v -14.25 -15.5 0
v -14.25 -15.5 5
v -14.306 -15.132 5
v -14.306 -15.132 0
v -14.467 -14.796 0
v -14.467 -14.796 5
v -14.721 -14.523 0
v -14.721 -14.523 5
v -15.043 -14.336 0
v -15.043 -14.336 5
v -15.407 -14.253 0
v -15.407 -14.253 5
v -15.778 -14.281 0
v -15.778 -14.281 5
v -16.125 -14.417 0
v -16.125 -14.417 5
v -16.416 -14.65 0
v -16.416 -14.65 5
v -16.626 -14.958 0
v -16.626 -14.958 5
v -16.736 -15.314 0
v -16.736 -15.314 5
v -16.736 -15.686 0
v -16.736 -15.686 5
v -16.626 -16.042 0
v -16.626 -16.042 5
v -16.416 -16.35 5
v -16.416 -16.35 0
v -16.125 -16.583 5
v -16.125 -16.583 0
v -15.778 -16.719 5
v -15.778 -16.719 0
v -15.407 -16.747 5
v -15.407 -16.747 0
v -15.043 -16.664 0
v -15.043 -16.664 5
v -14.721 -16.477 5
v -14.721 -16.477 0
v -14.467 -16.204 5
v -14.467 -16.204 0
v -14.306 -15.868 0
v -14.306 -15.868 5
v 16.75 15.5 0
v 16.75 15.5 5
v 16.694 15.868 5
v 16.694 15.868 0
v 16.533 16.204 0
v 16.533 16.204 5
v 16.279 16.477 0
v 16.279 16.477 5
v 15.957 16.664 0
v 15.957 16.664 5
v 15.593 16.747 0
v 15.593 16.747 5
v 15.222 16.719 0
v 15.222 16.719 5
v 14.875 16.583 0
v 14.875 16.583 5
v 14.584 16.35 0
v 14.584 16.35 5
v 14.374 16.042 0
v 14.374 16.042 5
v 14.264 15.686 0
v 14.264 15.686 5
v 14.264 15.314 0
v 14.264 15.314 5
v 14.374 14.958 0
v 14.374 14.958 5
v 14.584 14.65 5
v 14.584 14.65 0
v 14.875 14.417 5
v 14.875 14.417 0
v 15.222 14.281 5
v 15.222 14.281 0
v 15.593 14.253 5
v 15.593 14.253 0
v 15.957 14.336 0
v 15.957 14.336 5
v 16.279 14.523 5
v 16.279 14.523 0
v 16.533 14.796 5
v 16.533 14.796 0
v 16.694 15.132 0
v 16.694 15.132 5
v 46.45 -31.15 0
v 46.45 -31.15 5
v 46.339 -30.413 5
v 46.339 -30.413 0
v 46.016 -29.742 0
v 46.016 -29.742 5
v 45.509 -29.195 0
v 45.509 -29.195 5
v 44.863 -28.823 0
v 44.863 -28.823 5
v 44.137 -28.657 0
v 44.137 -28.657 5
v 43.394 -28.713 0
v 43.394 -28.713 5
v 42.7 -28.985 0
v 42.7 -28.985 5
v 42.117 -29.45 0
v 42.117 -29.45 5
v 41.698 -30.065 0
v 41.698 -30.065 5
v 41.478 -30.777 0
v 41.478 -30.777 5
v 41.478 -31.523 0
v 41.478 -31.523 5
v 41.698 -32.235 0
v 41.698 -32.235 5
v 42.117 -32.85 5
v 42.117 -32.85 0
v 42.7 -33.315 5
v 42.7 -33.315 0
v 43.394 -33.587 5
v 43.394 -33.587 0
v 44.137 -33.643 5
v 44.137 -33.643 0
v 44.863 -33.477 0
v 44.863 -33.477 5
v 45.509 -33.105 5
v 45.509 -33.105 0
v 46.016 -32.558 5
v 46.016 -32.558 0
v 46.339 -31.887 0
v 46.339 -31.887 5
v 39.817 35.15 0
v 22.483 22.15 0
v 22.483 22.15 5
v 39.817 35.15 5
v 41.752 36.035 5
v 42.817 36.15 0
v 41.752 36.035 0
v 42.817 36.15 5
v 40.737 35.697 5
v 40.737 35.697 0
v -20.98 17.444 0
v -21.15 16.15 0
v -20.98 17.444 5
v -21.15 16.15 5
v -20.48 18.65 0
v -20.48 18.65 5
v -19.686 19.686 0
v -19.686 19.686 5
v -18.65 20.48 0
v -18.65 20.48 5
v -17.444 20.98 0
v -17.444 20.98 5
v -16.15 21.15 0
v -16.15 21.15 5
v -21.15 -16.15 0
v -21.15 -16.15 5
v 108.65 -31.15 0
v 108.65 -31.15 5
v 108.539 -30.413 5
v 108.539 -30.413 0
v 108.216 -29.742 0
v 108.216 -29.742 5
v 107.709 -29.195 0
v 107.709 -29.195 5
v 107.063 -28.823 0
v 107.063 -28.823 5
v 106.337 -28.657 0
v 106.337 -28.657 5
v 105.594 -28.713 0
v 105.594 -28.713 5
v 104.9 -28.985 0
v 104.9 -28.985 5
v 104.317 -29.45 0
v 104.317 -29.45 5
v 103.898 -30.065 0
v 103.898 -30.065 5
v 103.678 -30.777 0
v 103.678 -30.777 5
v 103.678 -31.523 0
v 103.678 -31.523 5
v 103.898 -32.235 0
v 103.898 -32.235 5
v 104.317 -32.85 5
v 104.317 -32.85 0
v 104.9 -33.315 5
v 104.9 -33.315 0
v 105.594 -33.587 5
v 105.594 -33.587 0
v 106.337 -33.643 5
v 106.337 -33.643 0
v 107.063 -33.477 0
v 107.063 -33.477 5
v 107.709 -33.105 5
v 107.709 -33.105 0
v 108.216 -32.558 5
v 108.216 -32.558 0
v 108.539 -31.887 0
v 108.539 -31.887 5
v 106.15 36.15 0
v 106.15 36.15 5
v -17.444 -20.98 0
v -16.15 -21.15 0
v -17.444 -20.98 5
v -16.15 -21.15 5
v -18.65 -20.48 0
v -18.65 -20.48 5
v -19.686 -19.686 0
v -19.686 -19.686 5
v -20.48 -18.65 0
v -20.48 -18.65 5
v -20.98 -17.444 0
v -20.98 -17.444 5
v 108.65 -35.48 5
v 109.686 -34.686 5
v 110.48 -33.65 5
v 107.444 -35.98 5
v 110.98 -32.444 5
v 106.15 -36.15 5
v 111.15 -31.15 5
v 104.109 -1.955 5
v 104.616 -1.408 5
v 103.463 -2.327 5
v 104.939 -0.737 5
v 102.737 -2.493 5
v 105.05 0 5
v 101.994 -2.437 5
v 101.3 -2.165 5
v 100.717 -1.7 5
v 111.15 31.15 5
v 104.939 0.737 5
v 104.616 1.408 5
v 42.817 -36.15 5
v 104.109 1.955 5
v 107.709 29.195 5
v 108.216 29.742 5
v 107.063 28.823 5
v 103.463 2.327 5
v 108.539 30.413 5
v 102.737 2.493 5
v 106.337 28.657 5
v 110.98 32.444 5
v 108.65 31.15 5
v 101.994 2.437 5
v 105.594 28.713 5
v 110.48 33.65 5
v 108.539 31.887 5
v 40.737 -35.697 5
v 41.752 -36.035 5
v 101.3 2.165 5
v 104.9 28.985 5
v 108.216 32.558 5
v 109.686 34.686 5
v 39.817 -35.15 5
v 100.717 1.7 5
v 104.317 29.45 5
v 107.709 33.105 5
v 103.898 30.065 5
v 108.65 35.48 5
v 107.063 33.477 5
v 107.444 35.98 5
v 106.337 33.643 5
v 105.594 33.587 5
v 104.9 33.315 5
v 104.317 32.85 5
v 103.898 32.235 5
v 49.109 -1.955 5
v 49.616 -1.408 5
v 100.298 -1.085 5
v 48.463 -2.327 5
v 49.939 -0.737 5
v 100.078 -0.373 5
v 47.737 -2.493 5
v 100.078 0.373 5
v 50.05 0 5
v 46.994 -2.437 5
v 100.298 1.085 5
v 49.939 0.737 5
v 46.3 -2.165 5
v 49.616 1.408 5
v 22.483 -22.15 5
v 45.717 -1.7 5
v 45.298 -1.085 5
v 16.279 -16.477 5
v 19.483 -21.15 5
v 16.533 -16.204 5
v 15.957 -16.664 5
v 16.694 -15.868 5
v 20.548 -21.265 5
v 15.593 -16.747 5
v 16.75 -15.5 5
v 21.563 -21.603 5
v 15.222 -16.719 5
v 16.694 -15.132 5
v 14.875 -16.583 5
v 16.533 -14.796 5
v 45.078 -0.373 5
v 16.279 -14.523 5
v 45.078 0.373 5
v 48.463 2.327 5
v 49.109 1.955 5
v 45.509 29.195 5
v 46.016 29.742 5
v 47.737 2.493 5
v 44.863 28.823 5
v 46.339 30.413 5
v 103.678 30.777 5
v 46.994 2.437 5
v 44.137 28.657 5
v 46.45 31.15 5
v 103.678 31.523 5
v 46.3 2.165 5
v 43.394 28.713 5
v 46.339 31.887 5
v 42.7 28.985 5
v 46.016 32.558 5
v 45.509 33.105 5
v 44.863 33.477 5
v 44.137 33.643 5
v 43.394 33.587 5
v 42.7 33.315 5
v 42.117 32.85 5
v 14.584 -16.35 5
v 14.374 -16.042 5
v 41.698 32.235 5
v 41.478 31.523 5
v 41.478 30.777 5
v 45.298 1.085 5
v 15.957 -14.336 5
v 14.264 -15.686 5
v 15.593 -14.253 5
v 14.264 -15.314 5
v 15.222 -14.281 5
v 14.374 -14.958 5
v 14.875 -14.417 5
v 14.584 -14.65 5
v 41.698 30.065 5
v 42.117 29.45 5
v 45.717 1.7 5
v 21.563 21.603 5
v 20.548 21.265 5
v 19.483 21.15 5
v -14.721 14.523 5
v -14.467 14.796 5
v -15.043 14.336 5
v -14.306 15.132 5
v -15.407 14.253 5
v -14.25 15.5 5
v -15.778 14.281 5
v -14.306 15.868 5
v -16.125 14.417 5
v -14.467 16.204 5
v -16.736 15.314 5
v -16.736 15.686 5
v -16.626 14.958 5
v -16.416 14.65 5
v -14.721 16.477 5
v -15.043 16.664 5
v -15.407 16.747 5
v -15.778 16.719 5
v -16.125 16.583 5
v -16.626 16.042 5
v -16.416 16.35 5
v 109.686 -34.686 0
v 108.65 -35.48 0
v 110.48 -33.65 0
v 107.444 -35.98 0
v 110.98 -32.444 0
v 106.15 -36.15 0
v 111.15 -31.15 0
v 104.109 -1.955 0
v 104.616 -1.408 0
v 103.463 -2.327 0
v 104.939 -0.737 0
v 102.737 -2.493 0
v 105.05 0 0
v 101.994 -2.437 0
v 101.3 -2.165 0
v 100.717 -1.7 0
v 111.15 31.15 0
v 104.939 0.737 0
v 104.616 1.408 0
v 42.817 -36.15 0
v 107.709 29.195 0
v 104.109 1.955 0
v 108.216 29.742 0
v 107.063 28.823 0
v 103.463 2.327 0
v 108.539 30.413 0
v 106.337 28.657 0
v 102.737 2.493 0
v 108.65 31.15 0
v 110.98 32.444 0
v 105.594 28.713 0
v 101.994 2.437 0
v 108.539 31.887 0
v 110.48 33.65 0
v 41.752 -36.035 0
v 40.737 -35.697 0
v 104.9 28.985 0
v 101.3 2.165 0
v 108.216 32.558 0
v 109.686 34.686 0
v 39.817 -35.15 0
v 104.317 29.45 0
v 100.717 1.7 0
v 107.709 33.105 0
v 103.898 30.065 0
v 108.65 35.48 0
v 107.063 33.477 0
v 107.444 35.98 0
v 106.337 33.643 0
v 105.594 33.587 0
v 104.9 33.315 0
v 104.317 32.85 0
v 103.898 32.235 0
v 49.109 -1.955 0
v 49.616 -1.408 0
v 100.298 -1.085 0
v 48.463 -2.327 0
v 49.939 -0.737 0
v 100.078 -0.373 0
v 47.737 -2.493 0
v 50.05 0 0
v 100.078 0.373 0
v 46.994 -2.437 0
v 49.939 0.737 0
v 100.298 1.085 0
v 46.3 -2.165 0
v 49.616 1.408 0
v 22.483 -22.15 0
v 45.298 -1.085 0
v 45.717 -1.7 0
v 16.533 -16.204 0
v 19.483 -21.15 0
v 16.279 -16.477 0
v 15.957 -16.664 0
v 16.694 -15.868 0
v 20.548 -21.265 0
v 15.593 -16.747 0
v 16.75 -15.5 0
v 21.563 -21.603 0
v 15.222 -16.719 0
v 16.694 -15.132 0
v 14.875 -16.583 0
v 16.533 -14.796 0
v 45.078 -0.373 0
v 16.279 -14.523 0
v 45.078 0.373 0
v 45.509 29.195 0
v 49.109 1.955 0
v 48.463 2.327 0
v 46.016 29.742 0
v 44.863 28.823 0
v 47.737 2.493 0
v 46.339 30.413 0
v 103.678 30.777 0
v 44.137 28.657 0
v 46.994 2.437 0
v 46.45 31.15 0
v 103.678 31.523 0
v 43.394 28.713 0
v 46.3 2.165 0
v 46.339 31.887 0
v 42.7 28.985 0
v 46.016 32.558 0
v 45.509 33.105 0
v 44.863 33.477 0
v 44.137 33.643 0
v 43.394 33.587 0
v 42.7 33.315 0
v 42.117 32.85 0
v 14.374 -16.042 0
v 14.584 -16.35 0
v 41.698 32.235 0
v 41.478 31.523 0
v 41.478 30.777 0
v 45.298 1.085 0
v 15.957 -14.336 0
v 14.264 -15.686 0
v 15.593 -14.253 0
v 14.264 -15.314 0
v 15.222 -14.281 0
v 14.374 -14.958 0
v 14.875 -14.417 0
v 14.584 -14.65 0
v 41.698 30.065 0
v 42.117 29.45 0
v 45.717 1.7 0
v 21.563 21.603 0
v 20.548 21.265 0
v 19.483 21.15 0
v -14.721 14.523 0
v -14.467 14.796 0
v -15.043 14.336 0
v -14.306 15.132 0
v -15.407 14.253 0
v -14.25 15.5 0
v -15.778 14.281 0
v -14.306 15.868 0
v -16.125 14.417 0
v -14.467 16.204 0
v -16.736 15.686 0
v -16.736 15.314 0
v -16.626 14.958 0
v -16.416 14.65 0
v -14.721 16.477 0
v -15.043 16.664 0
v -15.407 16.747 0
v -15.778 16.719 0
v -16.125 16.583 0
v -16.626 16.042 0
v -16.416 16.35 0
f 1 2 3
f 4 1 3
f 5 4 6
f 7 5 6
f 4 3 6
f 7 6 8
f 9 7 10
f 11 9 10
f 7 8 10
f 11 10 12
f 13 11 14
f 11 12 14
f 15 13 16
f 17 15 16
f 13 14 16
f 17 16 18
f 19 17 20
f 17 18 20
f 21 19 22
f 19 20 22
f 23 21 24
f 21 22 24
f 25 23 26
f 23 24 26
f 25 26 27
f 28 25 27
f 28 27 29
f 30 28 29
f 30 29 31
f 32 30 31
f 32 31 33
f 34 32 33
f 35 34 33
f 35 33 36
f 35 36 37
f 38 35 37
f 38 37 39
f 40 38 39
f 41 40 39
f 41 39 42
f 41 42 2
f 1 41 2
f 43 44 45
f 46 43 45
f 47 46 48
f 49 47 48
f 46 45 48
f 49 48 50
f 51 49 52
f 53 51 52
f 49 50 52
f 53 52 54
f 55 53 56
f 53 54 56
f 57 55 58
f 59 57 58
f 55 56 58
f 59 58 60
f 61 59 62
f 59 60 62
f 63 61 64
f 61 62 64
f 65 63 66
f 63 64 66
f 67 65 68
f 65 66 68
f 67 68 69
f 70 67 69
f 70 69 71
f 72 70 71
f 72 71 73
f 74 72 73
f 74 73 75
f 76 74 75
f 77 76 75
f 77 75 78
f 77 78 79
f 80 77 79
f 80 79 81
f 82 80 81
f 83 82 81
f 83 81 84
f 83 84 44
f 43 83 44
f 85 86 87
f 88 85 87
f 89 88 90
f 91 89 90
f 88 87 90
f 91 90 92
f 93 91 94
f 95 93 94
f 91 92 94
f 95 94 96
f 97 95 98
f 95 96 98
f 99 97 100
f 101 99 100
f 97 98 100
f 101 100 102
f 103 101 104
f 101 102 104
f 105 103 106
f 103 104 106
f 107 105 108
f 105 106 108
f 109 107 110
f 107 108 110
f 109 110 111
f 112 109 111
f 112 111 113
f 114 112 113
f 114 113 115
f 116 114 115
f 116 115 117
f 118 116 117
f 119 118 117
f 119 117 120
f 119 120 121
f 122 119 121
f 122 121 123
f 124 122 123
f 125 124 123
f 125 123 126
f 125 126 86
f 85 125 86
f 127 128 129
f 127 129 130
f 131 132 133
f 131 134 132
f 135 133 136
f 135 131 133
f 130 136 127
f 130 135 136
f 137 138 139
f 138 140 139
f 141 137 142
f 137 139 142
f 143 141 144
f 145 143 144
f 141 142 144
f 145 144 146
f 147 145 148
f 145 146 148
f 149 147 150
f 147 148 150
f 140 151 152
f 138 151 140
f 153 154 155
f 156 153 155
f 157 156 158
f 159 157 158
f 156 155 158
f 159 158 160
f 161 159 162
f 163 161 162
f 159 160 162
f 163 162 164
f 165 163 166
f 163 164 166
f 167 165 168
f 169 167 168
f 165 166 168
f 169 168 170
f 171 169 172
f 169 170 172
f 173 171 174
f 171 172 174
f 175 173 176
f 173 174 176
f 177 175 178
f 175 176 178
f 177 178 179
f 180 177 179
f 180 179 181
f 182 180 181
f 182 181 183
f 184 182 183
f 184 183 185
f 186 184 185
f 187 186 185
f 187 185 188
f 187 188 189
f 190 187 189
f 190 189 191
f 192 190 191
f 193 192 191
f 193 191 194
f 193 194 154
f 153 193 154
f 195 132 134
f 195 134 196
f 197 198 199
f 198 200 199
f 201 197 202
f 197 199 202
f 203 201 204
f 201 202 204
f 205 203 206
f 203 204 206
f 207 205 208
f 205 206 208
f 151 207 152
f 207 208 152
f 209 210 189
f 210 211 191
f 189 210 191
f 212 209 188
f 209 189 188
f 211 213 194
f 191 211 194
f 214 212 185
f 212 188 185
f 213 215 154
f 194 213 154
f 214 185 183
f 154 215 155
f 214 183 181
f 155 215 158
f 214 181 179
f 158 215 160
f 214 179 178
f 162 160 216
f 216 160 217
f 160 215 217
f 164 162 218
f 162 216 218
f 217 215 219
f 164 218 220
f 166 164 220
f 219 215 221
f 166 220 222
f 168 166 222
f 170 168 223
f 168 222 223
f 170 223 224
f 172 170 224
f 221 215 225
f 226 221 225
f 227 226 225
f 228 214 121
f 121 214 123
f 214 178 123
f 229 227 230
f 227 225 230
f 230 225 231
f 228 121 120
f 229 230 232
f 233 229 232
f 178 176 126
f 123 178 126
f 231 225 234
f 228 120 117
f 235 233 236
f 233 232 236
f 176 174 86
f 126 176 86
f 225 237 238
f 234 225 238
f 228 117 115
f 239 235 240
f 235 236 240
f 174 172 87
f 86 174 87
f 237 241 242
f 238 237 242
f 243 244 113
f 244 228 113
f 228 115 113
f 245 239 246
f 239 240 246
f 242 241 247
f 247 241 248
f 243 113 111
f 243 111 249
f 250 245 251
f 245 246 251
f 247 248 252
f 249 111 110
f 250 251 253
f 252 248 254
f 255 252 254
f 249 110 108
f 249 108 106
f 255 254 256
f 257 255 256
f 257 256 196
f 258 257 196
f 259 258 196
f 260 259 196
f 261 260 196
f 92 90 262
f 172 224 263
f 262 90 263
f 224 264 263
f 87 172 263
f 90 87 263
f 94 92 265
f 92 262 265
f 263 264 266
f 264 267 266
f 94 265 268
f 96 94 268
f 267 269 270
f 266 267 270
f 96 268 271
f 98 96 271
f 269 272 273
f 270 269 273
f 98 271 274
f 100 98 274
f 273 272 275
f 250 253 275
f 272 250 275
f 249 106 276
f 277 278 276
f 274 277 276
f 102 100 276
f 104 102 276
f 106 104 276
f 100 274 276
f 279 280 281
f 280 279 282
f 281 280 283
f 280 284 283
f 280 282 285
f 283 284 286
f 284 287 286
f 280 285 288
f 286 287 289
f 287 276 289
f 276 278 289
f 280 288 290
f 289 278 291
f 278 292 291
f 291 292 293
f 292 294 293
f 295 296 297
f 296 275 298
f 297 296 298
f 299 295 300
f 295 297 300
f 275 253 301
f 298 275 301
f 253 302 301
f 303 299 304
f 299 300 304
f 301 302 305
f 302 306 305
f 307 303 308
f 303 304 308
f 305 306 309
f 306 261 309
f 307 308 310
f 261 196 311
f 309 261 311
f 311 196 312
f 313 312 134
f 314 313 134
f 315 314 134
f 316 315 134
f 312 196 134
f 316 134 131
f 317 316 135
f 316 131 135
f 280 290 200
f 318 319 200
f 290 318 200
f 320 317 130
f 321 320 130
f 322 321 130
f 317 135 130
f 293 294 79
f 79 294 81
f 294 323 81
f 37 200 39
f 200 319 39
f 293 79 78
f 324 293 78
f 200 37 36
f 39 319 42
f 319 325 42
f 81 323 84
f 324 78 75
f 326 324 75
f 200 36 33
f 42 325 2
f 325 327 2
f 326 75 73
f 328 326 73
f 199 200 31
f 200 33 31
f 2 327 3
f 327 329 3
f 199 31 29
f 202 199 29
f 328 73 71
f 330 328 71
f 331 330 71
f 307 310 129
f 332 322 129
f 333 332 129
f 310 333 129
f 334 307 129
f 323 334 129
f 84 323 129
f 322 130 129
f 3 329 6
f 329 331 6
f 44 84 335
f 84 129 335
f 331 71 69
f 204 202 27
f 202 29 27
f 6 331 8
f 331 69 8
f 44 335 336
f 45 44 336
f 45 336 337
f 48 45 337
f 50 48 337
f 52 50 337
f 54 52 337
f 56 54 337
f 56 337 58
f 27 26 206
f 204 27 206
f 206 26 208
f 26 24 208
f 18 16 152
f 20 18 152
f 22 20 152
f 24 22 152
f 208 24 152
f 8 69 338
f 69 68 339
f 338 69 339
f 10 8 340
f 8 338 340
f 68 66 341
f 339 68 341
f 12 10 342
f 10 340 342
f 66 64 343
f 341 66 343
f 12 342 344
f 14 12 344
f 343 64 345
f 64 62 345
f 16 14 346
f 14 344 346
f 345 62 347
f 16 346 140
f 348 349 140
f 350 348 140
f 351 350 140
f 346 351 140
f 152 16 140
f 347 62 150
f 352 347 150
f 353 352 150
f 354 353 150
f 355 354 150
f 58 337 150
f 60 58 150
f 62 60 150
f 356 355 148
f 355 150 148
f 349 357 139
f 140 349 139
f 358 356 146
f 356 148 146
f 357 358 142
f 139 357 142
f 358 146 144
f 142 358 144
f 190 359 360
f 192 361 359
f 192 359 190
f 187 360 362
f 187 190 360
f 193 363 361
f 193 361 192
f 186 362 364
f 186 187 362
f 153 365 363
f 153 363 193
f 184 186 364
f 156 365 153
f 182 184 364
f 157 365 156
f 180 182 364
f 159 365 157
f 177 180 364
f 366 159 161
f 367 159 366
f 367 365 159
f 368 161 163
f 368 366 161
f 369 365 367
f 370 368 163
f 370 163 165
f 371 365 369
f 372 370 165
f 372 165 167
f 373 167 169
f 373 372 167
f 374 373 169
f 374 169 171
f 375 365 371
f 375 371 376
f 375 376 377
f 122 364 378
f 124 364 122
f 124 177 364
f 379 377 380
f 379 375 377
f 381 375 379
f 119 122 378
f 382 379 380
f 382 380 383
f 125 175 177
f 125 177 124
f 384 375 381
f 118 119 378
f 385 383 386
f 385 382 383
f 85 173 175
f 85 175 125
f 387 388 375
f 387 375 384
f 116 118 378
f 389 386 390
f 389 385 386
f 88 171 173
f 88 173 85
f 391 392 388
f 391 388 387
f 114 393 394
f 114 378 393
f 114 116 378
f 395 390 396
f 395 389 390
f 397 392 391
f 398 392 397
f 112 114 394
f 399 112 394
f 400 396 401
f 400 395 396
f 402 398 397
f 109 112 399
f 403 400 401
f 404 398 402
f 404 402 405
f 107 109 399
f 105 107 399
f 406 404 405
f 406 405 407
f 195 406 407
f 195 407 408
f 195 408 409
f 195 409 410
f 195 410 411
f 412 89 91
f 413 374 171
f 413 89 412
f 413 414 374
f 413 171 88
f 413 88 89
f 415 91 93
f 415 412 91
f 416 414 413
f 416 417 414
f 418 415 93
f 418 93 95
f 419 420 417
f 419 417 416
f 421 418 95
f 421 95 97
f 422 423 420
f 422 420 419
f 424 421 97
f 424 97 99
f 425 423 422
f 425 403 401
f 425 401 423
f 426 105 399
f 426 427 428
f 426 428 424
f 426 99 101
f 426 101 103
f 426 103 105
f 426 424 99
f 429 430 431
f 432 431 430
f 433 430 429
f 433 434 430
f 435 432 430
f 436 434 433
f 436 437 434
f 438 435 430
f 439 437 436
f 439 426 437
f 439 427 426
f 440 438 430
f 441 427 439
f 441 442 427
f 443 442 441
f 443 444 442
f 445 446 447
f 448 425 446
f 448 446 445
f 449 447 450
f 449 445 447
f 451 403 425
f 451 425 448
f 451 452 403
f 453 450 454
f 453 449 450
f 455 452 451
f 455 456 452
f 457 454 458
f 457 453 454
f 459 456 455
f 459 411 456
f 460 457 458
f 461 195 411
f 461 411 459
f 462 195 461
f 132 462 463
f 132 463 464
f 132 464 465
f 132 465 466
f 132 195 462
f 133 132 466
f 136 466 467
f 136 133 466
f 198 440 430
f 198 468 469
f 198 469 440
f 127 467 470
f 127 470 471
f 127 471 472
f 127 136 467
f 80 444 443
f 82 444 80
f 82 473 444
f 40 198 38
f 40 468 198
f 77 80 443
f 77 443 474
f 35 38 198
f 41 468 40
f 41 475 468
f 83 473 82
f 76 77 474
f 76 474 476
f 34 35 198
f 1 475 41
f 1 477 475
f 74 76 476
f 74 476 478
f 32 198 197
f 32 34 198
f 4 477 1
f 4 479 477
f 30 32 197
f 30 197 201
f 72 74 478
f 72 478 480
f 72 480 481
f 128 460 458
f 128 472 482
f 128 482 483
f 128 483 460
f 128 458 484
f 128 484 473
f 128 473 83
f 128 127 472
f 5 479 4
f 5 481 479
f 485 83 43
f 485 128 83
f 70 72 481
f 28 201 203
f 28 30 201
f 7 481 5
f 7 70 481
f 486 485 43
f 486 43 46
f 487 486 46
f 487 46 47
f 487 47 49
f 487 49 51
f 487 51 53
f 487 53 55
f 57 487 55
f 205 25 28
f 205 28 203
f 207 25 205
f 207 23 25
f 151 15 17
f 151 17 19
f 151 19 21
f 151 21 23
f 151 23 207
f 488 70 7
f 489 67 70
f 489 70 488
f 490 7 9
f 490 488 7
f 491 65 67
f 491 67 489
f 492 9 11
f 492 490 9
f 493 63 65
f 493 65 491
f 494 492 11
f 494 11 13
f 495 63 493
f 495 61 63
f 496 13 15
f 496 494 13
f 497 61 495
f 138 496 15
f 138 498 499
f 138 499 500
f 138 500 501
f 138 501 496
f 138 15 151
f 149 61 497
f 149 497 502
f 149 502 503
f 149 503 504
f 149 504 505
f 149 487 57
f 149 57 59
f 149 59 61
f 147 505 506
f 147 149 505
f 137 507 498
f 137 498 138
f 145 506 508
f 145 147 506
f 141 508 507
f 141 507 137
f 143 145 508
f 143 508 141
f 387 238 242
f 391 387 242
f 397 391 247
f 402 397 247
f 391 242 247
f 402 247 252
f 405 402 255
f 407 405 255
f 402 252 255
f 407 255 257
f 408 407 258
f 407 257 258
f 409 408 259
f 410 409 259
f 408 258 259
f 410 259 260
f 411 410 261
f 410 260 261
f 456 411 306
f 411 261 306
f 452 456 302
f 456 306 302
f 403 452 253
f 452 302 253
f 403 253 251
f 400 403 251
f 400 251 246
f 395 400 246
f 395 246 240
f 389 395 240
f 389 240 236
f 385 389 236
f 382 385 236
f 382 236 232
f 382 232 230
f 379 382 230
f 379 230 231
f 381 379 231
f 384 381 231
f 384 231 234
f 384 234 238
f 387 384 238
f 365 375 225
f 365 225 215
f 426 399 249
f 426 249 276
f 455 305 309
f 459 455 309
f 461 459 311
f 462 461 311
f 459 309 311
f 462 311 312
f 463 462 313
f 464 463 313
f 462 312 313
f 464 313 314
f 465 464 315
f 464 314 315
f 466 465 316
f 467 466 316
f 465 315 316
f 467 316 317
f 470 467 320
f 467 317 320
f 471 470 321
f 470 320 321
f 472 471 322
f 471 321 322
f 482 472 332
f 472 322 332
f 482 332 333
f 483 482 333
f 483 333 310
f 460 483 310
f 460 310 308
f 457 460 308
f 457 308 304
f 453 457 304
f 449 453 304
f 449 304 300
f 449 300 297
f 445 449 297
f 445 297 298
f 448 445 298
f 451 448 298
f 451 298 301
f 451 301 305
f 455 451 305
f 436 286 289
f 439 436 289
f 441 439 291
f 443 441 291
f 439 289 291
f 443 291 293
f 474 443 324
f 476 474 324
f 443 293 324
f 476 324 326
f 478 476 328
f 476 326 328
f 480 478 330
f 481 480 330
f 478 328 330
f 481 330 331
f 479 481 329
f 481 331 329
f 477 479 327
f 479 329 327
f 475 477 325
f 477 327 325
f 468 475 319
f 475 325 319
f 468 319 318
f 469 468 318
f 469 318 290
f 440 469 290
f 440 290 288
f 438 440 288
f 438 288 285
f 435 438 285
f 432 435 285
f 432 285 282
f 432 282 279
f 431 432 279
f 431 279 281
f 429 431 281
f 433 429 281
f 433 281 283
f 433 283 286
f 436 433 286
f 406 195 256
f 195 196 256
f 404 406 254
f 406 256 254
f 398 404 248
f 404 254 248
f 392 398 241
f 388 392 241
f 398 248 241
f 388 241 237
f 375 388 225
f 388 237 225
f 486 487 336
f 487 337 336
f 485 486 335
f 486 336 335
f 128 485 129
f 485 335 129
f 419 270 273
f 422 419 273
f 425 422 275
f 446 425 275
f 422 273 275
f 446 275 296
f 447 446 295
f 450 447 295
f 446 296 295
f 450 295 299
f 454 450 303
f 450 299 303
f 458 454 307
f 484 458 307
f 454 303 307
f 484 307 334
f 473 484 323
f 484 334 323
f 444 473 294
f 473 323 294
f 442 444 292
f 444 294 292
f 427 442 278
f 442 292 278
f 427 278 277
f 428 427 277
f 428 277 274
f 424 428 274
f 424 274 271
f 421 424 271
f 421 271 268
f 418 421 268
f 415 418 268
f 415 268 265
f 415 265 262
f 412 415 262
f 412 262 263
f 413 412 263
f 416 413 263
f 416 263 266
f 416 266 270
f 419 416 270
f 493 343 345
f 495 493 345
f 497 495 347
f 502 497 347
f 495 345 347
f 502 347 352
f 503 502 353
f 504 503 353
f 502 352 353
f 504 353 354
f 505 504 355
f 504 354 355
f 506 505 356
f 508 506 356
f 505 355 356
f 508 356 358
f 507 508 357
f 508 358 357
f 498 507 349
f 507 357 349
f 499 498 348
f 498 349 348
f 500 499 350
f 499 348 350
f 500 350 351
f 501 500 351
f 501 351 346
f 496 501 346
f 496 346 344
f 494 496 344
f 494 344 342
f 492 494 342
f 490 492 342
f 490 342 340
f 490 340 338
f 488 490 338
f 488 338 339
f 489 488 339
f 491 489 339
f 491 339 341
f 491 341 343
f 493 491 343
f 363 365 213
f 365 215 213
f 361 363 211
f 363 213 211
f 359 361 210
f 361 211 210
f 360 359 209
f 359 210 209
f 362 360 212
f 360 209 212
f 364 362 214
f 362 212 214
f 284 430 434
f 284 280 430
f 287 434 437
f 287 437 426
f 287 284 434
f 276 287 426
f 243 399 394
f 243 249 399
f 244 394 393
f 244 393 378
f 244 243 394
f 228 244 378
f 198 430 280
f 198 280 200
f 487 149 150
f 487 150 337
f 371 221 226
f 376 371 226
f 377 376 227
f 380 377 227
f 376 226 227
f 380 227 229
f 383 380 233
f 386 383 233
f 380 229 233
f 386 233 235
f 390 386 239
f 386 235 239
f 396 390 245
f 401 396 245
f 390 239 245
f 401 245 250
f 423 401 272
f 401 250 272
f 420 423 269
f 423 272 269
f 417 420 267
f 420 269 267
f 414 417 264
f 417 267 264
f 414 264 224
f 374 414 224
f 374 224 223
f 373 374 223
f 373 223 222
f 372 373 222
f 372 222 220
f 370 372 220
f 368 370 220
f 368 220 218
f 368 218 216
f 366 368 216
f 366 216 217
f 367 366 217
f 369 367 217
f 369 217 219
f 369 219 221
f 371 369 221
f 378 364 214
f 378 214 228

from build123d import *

# Parameters (mm, degrees)
BOSS_EXTRUDE1_DEPTH = 5
FILLET2_R           = 5
FILLET3_R           = 5
FILLET4_R           = 5
FILLET5_R           = 5
FILLET6_R           = 5
FILLET7_R           = 5
FILLET8_R           = 5
FILLET9_R           = 5
SKETCH2_R           = 1.25
SKETCH2_R_2         = 2.5
CUT_EXTRUDE1_DEPTH  = 10


with BuildPart() as part:
    # Sketch1 → Boss-Extrude1 (new body)
    with BuildSketch(Plane.XY):
        Polygon((21.15, 21.15), (41.15, 36.15), (111.15, 36.15), (111.15, -36.15), (41.15, -36.15), (21.15, -21.15), (-21.15, -21.15), (-21.15, 21.15), align=None)
    extrude(amount=BOSS_EXTRUDE1_DEPTH)

    # Fillet2
    fillet2_edges = [part.edges().sort_by_distance(p)[0] for p in [
        (-21.15, -21.15, 2.5),
    ]]
    fillet(fillet2_edges, radius=FILLET2_R)

    # Fillet3
    fillet3_edges = [part.edges().sort_by_distance(p)[0] for p in [
        (-21.15, 21.15, 2.5),
    ]]
    fillet(fillet3_edges, radius=FILLET3_R)

    # Fillet4
    fillet4_edges = [part.edges().sort_by_distance(p)[0] for p in [
        (21.15, 21.15, 2.5),
    ]]
    fillet(fillet4_edges, radius=FILLET4_R)

    # Fillet5
    fillet5_edges = [part.edges().sort_by_distance(p)[0] for p in [
        (21.15, -21.15, 2.5),
    ]]
    fillet(fillet5_edges, radius=FILLET5_R)

    # Fillet6
    fillet6_edges = [part.edges().sort_by_distance(p)[0] for p in [
        (41.15, -36.15, 2.5),
    ]]
    fillet(fillet6_edges, radius=FILLET6_R)

    # Fillet7
    fillet7_edges = [part.edges().sort_by_distance(p)[0] for p in [
        (41.15, 36.15, 2.5),
    ]]
    fillet(fillet7_edges, radius=FILLET7_R)

    # Fillet8
    fillet8_edges = [part.edges().sort_by_distance(p)[0] for p in [
        (111.15, 36.15, 2.5),
    ]]
    fillet(fillet8_edges, radius=FILLET8_R)

    # Fillet9
    fillet9_edges = [part.edges().sort_by_distance(p)[0] for p in [
        (111.15, -36.15, 2.5),
    ]]
    fillet(fillet9_edges, radius=FILLET9_R)

    # Sketch2 → Cut-Extrude1 (cut)
    with BuildSketch(Plane.XY.offset(5)):
        with Locations((-15.5, -15.5)):
            Circle(SKETCH2_R)
        with Locations((-15.5, 15.5)):
            Circle(SKETCH2_R)
        with Locations((15.5, 15.5)):
            Circle(SKETCH2_R)
        with Locations((15.5, -15.5)):
            Circle(SKETCH2_R)
        with Locations((106.15, 31.15)):
            Circle(SKETCH2_R_2)
        with Locations((106.15, -31.15)):
            Circle(SKETCH2_R_2)
        with Locations((43.95, -31.15)):
            Circle(SKETCH2_R_2)
        with Locations((43.95, 31.15)):
            Circle(SKETCH2_R_2)
        with Locations((102.55, 0)):
            Circle(SKETCH2_R_2)
        with Locations((47.55, 0)):
            Circle(SKETCH2_R_2)
    extrude(amount=-CUT_EXTRUDE1_DEPTH, mode=Mode.SUBTRACT)


solid = part.part
